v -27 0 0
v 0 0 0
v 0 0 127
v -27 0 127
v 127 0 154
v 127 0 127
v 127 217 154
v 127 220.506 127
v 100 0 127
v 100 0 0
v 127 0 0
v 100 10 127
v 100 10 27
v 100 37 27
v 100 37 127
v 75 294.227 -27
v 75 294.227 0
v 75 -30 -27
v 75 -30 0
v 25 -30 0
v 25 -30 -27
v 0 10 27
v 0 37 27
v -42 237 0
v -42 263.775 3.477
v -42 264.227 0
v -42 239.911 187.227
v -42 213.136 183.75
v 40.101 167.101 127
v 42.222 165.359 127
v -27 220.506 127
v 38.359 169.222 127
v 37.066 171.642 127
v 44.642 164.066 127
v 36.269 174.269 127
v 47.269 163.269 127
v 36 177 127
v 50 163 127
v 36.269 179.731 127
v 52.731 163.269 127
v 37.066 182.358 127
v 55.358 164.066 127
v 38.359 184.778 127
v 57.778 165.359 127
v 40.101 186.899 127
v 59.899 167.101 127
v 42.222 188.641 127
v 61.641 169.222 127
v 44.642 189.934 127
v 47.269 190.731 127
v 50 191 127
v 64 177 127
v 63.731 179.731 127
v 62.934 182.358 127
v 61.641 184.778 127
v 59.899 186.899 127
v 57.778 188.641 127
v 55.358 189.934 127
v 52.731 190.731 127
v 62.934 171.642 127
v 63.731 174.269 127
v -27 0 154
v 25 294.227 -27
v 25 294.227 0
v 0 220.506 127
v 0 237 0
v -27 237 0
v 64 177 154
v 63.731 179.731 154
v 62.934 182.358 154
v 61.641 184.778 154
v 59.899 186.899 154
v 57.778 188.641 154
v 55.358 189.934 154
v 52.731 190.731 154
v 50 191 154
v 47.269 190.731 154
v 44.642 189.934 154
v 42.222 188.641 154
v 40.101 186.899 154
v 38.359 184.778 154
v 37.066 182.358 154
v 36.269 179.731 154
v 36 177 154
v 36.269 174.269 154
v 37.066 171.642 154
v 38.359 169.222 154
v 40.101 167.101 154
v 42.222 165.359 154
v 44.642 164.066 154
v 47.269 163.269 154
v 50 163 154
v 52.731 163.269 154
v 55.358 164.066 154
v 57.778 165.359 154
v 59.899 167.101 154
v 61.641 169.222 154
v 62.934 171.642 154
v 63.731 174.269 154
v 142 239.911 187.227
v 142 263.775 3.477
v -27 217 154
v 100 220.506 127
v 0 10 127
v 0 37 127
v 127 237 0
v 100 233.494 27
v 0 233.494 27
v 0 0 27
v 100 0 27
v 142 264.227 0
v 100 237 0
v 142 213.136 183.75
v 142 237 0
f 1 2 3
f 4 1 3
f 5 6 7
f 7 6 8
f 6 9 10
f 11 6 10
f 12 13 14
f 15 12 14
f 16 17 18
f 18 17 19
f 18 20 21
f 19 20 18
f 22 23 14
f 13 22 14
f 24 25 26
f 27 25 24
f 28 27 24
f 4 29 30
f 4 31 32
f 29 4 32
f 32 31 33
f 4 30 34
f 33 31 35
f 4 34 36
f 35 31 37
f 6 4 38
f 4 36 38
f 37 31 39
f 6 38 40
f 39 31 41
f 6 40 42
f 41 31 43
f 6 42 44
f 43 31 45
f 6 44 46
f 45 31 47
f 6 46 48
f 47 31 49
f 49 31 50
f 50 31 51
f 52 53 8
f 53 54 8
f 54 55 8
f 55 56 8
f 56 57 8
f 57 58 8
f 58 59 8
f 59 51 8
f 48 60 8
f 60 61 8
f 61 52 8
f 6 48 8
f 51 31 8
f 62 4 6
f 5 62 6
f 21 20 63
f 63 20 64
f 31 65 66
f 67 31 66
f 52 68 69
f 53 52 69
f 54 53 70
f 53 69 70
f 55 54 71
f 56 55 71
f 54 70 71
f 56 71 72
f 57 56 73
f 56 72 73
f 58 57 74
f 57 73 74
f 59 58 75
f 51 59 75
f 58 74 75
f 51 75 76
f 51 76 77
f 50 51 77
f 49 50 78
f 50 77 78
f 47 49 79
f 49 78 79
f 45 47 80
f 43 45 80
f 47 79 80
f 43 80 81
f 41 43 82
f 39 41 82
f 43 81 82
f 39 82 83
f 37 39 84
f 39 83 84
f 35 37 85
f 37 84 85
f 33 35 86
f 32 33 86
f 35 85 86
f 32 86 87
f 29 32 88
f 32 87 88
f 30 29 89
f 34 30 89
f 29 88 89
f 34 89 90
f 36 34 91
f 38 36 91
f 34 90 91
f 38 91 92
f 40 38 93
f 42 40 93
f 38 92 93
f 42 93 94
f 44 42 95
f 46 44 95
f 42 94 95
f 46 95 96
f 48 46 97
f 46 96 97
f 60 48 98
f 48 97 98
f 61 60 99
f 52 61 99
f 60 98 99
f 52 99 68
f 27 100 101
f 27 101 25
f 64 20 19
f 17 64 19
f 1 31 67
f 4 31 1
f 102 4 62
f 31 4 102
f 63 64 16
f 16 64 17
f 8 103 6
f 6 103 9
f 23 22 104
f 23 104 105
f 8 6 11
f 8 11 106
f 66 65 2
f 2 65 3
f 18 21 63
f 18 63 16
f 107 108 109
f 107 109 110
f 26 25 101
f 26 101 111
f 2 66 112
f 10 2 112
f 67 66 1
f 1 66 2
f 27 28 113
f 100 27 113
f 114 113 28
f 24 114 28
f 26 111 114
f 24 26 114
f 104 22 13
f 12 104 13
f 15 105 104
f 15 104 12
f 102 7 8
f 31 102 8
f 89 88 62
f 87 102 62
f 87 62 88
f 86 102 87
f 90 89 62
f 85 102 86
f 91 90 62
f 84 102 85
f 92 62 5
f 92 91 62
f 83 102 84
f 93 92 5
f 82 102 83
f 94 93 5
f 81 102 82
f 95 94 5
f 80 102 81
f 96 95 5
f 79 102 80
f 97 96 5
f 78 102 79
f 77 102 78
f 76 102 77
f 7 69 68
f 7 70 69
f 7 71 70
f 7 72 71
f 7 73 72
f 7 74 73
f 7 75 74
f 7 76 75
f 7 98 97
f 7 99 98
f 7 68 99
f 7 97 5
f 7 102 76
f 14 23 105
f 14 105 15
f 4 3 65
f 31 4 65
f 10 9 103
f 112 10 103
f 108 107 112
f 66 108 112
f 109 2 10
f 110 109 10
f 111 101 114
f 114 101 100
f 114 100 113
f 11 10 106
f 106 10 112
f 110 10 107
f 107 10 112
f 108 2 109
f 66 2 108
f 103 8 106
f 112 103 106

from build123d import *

# Parameters (mm, degrees)
F0_W      = 100
F0_H      = 237
F1_DEPTH  = 27
F2_W      = 100
F2_H      = 27
F3_DEPTH  = 100
F4_W      = 27
F4_H      = 100
F4_W_2    = 200
F4_W_3    = 10
F5_DEPTH  = 27
F6_W      = 27
F6_H      = 237
F6_W_2    = 127
F7_DEPTH  = 27
F8_R      = 14
F9_DEPTH  = 27
F11_DEPTH = 154.001
F13_DEPTH = 27
F14_W     = 100
F14_H     = 27.2267423081
F14_H_2   = 100.8397863263
F15_DEPTH = 27
F17_DEPTH = 184
F18_W     = 50
F18_H     = 30
F18_H_2   = 237
F18_H_3   = 27.2267423081
F19_DEPTH = 27


with BuildPart() as f1:
    # F0 (on Top) → F1 (new body)
    with BuildSketch(Plane.XY):
        with Locations((50, 118.5)):
            Rectangle(F0_W, F0_H)
    extrude(amount=F1_DEPTH)


with BuildPart() as f3:
    # F2 (on face) → F3 (new body)
    with BuildSketch(Plane.XY.offset(27)):
        with Locations((50, 23.5)):
            Rectangle(F2_W, F2_H)
    extrude(amount=F3_DEPTH)


with BuildPart() as f5:
    # F4 (on face) → F5 (new body)
    with BuildSketch(Plane.YZ.offset(100)):
        with Locations((23.5, 77)):
            Rectangle(F4_W, F4_H)
        with Locations((137, 77)):
            Rectangle(F4_W_2, F4_H)
        Polygon((0, 27), (0, 0), (237, 0), (237, 27), (37, 27), (10, 27), align=None)
        with Locations((5, 77)):
            Rectangle(F4_W_3, F4_H)
    extrude(amount=F5_DEPTH)


with BuildPart() as f7:
    # F6 (on face) → F7 (new body)
    with BuildSketch(Plane.XY.offset(127)):
        with Locations((113.5, 118.5)):
            Rectangle(F6_W, F6_H)
        with Locations((36.5, 118.5)):
            Rectangle(F6_W_2, F6_H)
    extrude(amount=F7_DEPTH)

    # F8 (on face) → F9 (cut, through all)
    with BuildSketch(Plane.XY.offset(154)):
        with Locations((50, 177)):
            Circle(F8_R)
    extrude(amount=-F9_DEPTH, mode=Mode.SUBTRACT)


with BuildPart() as f11_tool:
    # F10 (on face) → F11 (new body, through all)
    with BuildSketch(Plane.YZ.offset(127)):
        Polygon((237, 127), (220.5064935065, 127), (237, 0), align=None)
        Polygon((217, 154), (220.5064935065, 127), (237, 127), (237, 154), align=None)
    extrude(amount=-F11_DEPTH)


with BuildPart() as f1_1:
    add(f1.part)

    # F11: cut by f11_tool
    add(f11_tool.part, mode=Mode.SUBTRACT)


with BuildPart() as f5_1:
    add(f5.part)

    # F11: cut by f11_tool
    add(f11_tool.part, mode=Mode.SUBTRACT)


with BuildPart() as f7_1:
    add(f7.part)

    # F11: cut by f11_tool
    add(f11_tool.part, mode=Mode.SUBTRACT)


with BuildPart() as f13:
    # F12 (on face) → F13 (new body)
    with BuildSketch(Plane(origin=(0, 0, 0), x_dir=(0, -1, 0), z_dir=(-1, 0, 0))):
        Polygon((0, 127), (-220.5064935065, 127), (-233.4935064935, 27), (0, 27), align=None)
        Polygon((0, 27), (-233.4935064935, 27), (-237, 0), (0, 0), align=None)
    extrude(amount=F13_DEPTH)


with BuildPart() as f15:
    # F14 (on face) → F15 (new body)
    with BuildSketch(Plane(origin=(0, 233.0689998341, 30.2687012772), x_dir=(-1, 0, 0), z_dir=(0, 0.9916720735, 0.128788581))):
        Polygon((27, -30.5228936916), (27, 97.5436349427), (0, 97.5436349427), (0, -3.2961513835), (0, -30.5228936916), align=None)
        Polygon((27, 124.7703772508), (27, 97.5436349427), (27, -30.5228936916), (42, -30.5228936916), (42, 154.7703772508), (-142, 154.7703772508), (-142, -30.5228936916), (-127, -30.5228936916), (-127, 97.5436349427), (-127, 124.7703772508), align=None)
        Polygon((-100, -3.2961513835), (-100, 97.5436349427), (-127, 97.5436349427), (-127, -30.5228936916), (-100, -30.5228936916), align=None)
        with Locations((-50, -16.9095225376)):
            Rectangle(F14_W, F14_H)
        Polygon((0, 97.5436349427), (27, 97.5436349427), (27, 124.7703772508), (-127, 124.7703772508), (-127, 97.5436349427), (-100, 97.5436349427), align=None)
        with Locations((-50, 47.1237417796)):
            Rectangle(F14_W, F14_H_2)
    extrude(amount=F15_DEPTH)

    # F16 (on face) → F17 (join, through all)
    with BuildSketch(Plane(origin=(-42, 0, 0), x_dir=(0, -1, 0), z_dir=(-1, 0, 0))):
        Polygon((-264.2267423081, 0), (-237, 0), (-263.7751459852, 3.4772916864), align=None)
    extrude(amount=-F17_DEPTH)


with BuildPart() as f19:
    # F18 (on face) → F19 (new body)
    with BuildSketch(Plane(origin=(0, 0, 0), x_dir=(1, 0, 0), z_dir=(0, 0, -1))):
        with Locations((50, 15)):
            Rectangle(F18_W, F18_H)
        with Locations((50, -118.5)):
            Rectangle(F18_W, F18_H_2)
        with Locations((50, -250.613371154)):
            Rectangle(F18_W, F18_H_3)
        with Locations((50, -279.2267423081)):
            Rectangle(F18_W, F18_H)
    extrude(amount=F19_DEPTH)


solid = Compound([f3.part, f1_1.part, f5_1.part, f7_1.part, f13.part, f15.part, f19.part])
